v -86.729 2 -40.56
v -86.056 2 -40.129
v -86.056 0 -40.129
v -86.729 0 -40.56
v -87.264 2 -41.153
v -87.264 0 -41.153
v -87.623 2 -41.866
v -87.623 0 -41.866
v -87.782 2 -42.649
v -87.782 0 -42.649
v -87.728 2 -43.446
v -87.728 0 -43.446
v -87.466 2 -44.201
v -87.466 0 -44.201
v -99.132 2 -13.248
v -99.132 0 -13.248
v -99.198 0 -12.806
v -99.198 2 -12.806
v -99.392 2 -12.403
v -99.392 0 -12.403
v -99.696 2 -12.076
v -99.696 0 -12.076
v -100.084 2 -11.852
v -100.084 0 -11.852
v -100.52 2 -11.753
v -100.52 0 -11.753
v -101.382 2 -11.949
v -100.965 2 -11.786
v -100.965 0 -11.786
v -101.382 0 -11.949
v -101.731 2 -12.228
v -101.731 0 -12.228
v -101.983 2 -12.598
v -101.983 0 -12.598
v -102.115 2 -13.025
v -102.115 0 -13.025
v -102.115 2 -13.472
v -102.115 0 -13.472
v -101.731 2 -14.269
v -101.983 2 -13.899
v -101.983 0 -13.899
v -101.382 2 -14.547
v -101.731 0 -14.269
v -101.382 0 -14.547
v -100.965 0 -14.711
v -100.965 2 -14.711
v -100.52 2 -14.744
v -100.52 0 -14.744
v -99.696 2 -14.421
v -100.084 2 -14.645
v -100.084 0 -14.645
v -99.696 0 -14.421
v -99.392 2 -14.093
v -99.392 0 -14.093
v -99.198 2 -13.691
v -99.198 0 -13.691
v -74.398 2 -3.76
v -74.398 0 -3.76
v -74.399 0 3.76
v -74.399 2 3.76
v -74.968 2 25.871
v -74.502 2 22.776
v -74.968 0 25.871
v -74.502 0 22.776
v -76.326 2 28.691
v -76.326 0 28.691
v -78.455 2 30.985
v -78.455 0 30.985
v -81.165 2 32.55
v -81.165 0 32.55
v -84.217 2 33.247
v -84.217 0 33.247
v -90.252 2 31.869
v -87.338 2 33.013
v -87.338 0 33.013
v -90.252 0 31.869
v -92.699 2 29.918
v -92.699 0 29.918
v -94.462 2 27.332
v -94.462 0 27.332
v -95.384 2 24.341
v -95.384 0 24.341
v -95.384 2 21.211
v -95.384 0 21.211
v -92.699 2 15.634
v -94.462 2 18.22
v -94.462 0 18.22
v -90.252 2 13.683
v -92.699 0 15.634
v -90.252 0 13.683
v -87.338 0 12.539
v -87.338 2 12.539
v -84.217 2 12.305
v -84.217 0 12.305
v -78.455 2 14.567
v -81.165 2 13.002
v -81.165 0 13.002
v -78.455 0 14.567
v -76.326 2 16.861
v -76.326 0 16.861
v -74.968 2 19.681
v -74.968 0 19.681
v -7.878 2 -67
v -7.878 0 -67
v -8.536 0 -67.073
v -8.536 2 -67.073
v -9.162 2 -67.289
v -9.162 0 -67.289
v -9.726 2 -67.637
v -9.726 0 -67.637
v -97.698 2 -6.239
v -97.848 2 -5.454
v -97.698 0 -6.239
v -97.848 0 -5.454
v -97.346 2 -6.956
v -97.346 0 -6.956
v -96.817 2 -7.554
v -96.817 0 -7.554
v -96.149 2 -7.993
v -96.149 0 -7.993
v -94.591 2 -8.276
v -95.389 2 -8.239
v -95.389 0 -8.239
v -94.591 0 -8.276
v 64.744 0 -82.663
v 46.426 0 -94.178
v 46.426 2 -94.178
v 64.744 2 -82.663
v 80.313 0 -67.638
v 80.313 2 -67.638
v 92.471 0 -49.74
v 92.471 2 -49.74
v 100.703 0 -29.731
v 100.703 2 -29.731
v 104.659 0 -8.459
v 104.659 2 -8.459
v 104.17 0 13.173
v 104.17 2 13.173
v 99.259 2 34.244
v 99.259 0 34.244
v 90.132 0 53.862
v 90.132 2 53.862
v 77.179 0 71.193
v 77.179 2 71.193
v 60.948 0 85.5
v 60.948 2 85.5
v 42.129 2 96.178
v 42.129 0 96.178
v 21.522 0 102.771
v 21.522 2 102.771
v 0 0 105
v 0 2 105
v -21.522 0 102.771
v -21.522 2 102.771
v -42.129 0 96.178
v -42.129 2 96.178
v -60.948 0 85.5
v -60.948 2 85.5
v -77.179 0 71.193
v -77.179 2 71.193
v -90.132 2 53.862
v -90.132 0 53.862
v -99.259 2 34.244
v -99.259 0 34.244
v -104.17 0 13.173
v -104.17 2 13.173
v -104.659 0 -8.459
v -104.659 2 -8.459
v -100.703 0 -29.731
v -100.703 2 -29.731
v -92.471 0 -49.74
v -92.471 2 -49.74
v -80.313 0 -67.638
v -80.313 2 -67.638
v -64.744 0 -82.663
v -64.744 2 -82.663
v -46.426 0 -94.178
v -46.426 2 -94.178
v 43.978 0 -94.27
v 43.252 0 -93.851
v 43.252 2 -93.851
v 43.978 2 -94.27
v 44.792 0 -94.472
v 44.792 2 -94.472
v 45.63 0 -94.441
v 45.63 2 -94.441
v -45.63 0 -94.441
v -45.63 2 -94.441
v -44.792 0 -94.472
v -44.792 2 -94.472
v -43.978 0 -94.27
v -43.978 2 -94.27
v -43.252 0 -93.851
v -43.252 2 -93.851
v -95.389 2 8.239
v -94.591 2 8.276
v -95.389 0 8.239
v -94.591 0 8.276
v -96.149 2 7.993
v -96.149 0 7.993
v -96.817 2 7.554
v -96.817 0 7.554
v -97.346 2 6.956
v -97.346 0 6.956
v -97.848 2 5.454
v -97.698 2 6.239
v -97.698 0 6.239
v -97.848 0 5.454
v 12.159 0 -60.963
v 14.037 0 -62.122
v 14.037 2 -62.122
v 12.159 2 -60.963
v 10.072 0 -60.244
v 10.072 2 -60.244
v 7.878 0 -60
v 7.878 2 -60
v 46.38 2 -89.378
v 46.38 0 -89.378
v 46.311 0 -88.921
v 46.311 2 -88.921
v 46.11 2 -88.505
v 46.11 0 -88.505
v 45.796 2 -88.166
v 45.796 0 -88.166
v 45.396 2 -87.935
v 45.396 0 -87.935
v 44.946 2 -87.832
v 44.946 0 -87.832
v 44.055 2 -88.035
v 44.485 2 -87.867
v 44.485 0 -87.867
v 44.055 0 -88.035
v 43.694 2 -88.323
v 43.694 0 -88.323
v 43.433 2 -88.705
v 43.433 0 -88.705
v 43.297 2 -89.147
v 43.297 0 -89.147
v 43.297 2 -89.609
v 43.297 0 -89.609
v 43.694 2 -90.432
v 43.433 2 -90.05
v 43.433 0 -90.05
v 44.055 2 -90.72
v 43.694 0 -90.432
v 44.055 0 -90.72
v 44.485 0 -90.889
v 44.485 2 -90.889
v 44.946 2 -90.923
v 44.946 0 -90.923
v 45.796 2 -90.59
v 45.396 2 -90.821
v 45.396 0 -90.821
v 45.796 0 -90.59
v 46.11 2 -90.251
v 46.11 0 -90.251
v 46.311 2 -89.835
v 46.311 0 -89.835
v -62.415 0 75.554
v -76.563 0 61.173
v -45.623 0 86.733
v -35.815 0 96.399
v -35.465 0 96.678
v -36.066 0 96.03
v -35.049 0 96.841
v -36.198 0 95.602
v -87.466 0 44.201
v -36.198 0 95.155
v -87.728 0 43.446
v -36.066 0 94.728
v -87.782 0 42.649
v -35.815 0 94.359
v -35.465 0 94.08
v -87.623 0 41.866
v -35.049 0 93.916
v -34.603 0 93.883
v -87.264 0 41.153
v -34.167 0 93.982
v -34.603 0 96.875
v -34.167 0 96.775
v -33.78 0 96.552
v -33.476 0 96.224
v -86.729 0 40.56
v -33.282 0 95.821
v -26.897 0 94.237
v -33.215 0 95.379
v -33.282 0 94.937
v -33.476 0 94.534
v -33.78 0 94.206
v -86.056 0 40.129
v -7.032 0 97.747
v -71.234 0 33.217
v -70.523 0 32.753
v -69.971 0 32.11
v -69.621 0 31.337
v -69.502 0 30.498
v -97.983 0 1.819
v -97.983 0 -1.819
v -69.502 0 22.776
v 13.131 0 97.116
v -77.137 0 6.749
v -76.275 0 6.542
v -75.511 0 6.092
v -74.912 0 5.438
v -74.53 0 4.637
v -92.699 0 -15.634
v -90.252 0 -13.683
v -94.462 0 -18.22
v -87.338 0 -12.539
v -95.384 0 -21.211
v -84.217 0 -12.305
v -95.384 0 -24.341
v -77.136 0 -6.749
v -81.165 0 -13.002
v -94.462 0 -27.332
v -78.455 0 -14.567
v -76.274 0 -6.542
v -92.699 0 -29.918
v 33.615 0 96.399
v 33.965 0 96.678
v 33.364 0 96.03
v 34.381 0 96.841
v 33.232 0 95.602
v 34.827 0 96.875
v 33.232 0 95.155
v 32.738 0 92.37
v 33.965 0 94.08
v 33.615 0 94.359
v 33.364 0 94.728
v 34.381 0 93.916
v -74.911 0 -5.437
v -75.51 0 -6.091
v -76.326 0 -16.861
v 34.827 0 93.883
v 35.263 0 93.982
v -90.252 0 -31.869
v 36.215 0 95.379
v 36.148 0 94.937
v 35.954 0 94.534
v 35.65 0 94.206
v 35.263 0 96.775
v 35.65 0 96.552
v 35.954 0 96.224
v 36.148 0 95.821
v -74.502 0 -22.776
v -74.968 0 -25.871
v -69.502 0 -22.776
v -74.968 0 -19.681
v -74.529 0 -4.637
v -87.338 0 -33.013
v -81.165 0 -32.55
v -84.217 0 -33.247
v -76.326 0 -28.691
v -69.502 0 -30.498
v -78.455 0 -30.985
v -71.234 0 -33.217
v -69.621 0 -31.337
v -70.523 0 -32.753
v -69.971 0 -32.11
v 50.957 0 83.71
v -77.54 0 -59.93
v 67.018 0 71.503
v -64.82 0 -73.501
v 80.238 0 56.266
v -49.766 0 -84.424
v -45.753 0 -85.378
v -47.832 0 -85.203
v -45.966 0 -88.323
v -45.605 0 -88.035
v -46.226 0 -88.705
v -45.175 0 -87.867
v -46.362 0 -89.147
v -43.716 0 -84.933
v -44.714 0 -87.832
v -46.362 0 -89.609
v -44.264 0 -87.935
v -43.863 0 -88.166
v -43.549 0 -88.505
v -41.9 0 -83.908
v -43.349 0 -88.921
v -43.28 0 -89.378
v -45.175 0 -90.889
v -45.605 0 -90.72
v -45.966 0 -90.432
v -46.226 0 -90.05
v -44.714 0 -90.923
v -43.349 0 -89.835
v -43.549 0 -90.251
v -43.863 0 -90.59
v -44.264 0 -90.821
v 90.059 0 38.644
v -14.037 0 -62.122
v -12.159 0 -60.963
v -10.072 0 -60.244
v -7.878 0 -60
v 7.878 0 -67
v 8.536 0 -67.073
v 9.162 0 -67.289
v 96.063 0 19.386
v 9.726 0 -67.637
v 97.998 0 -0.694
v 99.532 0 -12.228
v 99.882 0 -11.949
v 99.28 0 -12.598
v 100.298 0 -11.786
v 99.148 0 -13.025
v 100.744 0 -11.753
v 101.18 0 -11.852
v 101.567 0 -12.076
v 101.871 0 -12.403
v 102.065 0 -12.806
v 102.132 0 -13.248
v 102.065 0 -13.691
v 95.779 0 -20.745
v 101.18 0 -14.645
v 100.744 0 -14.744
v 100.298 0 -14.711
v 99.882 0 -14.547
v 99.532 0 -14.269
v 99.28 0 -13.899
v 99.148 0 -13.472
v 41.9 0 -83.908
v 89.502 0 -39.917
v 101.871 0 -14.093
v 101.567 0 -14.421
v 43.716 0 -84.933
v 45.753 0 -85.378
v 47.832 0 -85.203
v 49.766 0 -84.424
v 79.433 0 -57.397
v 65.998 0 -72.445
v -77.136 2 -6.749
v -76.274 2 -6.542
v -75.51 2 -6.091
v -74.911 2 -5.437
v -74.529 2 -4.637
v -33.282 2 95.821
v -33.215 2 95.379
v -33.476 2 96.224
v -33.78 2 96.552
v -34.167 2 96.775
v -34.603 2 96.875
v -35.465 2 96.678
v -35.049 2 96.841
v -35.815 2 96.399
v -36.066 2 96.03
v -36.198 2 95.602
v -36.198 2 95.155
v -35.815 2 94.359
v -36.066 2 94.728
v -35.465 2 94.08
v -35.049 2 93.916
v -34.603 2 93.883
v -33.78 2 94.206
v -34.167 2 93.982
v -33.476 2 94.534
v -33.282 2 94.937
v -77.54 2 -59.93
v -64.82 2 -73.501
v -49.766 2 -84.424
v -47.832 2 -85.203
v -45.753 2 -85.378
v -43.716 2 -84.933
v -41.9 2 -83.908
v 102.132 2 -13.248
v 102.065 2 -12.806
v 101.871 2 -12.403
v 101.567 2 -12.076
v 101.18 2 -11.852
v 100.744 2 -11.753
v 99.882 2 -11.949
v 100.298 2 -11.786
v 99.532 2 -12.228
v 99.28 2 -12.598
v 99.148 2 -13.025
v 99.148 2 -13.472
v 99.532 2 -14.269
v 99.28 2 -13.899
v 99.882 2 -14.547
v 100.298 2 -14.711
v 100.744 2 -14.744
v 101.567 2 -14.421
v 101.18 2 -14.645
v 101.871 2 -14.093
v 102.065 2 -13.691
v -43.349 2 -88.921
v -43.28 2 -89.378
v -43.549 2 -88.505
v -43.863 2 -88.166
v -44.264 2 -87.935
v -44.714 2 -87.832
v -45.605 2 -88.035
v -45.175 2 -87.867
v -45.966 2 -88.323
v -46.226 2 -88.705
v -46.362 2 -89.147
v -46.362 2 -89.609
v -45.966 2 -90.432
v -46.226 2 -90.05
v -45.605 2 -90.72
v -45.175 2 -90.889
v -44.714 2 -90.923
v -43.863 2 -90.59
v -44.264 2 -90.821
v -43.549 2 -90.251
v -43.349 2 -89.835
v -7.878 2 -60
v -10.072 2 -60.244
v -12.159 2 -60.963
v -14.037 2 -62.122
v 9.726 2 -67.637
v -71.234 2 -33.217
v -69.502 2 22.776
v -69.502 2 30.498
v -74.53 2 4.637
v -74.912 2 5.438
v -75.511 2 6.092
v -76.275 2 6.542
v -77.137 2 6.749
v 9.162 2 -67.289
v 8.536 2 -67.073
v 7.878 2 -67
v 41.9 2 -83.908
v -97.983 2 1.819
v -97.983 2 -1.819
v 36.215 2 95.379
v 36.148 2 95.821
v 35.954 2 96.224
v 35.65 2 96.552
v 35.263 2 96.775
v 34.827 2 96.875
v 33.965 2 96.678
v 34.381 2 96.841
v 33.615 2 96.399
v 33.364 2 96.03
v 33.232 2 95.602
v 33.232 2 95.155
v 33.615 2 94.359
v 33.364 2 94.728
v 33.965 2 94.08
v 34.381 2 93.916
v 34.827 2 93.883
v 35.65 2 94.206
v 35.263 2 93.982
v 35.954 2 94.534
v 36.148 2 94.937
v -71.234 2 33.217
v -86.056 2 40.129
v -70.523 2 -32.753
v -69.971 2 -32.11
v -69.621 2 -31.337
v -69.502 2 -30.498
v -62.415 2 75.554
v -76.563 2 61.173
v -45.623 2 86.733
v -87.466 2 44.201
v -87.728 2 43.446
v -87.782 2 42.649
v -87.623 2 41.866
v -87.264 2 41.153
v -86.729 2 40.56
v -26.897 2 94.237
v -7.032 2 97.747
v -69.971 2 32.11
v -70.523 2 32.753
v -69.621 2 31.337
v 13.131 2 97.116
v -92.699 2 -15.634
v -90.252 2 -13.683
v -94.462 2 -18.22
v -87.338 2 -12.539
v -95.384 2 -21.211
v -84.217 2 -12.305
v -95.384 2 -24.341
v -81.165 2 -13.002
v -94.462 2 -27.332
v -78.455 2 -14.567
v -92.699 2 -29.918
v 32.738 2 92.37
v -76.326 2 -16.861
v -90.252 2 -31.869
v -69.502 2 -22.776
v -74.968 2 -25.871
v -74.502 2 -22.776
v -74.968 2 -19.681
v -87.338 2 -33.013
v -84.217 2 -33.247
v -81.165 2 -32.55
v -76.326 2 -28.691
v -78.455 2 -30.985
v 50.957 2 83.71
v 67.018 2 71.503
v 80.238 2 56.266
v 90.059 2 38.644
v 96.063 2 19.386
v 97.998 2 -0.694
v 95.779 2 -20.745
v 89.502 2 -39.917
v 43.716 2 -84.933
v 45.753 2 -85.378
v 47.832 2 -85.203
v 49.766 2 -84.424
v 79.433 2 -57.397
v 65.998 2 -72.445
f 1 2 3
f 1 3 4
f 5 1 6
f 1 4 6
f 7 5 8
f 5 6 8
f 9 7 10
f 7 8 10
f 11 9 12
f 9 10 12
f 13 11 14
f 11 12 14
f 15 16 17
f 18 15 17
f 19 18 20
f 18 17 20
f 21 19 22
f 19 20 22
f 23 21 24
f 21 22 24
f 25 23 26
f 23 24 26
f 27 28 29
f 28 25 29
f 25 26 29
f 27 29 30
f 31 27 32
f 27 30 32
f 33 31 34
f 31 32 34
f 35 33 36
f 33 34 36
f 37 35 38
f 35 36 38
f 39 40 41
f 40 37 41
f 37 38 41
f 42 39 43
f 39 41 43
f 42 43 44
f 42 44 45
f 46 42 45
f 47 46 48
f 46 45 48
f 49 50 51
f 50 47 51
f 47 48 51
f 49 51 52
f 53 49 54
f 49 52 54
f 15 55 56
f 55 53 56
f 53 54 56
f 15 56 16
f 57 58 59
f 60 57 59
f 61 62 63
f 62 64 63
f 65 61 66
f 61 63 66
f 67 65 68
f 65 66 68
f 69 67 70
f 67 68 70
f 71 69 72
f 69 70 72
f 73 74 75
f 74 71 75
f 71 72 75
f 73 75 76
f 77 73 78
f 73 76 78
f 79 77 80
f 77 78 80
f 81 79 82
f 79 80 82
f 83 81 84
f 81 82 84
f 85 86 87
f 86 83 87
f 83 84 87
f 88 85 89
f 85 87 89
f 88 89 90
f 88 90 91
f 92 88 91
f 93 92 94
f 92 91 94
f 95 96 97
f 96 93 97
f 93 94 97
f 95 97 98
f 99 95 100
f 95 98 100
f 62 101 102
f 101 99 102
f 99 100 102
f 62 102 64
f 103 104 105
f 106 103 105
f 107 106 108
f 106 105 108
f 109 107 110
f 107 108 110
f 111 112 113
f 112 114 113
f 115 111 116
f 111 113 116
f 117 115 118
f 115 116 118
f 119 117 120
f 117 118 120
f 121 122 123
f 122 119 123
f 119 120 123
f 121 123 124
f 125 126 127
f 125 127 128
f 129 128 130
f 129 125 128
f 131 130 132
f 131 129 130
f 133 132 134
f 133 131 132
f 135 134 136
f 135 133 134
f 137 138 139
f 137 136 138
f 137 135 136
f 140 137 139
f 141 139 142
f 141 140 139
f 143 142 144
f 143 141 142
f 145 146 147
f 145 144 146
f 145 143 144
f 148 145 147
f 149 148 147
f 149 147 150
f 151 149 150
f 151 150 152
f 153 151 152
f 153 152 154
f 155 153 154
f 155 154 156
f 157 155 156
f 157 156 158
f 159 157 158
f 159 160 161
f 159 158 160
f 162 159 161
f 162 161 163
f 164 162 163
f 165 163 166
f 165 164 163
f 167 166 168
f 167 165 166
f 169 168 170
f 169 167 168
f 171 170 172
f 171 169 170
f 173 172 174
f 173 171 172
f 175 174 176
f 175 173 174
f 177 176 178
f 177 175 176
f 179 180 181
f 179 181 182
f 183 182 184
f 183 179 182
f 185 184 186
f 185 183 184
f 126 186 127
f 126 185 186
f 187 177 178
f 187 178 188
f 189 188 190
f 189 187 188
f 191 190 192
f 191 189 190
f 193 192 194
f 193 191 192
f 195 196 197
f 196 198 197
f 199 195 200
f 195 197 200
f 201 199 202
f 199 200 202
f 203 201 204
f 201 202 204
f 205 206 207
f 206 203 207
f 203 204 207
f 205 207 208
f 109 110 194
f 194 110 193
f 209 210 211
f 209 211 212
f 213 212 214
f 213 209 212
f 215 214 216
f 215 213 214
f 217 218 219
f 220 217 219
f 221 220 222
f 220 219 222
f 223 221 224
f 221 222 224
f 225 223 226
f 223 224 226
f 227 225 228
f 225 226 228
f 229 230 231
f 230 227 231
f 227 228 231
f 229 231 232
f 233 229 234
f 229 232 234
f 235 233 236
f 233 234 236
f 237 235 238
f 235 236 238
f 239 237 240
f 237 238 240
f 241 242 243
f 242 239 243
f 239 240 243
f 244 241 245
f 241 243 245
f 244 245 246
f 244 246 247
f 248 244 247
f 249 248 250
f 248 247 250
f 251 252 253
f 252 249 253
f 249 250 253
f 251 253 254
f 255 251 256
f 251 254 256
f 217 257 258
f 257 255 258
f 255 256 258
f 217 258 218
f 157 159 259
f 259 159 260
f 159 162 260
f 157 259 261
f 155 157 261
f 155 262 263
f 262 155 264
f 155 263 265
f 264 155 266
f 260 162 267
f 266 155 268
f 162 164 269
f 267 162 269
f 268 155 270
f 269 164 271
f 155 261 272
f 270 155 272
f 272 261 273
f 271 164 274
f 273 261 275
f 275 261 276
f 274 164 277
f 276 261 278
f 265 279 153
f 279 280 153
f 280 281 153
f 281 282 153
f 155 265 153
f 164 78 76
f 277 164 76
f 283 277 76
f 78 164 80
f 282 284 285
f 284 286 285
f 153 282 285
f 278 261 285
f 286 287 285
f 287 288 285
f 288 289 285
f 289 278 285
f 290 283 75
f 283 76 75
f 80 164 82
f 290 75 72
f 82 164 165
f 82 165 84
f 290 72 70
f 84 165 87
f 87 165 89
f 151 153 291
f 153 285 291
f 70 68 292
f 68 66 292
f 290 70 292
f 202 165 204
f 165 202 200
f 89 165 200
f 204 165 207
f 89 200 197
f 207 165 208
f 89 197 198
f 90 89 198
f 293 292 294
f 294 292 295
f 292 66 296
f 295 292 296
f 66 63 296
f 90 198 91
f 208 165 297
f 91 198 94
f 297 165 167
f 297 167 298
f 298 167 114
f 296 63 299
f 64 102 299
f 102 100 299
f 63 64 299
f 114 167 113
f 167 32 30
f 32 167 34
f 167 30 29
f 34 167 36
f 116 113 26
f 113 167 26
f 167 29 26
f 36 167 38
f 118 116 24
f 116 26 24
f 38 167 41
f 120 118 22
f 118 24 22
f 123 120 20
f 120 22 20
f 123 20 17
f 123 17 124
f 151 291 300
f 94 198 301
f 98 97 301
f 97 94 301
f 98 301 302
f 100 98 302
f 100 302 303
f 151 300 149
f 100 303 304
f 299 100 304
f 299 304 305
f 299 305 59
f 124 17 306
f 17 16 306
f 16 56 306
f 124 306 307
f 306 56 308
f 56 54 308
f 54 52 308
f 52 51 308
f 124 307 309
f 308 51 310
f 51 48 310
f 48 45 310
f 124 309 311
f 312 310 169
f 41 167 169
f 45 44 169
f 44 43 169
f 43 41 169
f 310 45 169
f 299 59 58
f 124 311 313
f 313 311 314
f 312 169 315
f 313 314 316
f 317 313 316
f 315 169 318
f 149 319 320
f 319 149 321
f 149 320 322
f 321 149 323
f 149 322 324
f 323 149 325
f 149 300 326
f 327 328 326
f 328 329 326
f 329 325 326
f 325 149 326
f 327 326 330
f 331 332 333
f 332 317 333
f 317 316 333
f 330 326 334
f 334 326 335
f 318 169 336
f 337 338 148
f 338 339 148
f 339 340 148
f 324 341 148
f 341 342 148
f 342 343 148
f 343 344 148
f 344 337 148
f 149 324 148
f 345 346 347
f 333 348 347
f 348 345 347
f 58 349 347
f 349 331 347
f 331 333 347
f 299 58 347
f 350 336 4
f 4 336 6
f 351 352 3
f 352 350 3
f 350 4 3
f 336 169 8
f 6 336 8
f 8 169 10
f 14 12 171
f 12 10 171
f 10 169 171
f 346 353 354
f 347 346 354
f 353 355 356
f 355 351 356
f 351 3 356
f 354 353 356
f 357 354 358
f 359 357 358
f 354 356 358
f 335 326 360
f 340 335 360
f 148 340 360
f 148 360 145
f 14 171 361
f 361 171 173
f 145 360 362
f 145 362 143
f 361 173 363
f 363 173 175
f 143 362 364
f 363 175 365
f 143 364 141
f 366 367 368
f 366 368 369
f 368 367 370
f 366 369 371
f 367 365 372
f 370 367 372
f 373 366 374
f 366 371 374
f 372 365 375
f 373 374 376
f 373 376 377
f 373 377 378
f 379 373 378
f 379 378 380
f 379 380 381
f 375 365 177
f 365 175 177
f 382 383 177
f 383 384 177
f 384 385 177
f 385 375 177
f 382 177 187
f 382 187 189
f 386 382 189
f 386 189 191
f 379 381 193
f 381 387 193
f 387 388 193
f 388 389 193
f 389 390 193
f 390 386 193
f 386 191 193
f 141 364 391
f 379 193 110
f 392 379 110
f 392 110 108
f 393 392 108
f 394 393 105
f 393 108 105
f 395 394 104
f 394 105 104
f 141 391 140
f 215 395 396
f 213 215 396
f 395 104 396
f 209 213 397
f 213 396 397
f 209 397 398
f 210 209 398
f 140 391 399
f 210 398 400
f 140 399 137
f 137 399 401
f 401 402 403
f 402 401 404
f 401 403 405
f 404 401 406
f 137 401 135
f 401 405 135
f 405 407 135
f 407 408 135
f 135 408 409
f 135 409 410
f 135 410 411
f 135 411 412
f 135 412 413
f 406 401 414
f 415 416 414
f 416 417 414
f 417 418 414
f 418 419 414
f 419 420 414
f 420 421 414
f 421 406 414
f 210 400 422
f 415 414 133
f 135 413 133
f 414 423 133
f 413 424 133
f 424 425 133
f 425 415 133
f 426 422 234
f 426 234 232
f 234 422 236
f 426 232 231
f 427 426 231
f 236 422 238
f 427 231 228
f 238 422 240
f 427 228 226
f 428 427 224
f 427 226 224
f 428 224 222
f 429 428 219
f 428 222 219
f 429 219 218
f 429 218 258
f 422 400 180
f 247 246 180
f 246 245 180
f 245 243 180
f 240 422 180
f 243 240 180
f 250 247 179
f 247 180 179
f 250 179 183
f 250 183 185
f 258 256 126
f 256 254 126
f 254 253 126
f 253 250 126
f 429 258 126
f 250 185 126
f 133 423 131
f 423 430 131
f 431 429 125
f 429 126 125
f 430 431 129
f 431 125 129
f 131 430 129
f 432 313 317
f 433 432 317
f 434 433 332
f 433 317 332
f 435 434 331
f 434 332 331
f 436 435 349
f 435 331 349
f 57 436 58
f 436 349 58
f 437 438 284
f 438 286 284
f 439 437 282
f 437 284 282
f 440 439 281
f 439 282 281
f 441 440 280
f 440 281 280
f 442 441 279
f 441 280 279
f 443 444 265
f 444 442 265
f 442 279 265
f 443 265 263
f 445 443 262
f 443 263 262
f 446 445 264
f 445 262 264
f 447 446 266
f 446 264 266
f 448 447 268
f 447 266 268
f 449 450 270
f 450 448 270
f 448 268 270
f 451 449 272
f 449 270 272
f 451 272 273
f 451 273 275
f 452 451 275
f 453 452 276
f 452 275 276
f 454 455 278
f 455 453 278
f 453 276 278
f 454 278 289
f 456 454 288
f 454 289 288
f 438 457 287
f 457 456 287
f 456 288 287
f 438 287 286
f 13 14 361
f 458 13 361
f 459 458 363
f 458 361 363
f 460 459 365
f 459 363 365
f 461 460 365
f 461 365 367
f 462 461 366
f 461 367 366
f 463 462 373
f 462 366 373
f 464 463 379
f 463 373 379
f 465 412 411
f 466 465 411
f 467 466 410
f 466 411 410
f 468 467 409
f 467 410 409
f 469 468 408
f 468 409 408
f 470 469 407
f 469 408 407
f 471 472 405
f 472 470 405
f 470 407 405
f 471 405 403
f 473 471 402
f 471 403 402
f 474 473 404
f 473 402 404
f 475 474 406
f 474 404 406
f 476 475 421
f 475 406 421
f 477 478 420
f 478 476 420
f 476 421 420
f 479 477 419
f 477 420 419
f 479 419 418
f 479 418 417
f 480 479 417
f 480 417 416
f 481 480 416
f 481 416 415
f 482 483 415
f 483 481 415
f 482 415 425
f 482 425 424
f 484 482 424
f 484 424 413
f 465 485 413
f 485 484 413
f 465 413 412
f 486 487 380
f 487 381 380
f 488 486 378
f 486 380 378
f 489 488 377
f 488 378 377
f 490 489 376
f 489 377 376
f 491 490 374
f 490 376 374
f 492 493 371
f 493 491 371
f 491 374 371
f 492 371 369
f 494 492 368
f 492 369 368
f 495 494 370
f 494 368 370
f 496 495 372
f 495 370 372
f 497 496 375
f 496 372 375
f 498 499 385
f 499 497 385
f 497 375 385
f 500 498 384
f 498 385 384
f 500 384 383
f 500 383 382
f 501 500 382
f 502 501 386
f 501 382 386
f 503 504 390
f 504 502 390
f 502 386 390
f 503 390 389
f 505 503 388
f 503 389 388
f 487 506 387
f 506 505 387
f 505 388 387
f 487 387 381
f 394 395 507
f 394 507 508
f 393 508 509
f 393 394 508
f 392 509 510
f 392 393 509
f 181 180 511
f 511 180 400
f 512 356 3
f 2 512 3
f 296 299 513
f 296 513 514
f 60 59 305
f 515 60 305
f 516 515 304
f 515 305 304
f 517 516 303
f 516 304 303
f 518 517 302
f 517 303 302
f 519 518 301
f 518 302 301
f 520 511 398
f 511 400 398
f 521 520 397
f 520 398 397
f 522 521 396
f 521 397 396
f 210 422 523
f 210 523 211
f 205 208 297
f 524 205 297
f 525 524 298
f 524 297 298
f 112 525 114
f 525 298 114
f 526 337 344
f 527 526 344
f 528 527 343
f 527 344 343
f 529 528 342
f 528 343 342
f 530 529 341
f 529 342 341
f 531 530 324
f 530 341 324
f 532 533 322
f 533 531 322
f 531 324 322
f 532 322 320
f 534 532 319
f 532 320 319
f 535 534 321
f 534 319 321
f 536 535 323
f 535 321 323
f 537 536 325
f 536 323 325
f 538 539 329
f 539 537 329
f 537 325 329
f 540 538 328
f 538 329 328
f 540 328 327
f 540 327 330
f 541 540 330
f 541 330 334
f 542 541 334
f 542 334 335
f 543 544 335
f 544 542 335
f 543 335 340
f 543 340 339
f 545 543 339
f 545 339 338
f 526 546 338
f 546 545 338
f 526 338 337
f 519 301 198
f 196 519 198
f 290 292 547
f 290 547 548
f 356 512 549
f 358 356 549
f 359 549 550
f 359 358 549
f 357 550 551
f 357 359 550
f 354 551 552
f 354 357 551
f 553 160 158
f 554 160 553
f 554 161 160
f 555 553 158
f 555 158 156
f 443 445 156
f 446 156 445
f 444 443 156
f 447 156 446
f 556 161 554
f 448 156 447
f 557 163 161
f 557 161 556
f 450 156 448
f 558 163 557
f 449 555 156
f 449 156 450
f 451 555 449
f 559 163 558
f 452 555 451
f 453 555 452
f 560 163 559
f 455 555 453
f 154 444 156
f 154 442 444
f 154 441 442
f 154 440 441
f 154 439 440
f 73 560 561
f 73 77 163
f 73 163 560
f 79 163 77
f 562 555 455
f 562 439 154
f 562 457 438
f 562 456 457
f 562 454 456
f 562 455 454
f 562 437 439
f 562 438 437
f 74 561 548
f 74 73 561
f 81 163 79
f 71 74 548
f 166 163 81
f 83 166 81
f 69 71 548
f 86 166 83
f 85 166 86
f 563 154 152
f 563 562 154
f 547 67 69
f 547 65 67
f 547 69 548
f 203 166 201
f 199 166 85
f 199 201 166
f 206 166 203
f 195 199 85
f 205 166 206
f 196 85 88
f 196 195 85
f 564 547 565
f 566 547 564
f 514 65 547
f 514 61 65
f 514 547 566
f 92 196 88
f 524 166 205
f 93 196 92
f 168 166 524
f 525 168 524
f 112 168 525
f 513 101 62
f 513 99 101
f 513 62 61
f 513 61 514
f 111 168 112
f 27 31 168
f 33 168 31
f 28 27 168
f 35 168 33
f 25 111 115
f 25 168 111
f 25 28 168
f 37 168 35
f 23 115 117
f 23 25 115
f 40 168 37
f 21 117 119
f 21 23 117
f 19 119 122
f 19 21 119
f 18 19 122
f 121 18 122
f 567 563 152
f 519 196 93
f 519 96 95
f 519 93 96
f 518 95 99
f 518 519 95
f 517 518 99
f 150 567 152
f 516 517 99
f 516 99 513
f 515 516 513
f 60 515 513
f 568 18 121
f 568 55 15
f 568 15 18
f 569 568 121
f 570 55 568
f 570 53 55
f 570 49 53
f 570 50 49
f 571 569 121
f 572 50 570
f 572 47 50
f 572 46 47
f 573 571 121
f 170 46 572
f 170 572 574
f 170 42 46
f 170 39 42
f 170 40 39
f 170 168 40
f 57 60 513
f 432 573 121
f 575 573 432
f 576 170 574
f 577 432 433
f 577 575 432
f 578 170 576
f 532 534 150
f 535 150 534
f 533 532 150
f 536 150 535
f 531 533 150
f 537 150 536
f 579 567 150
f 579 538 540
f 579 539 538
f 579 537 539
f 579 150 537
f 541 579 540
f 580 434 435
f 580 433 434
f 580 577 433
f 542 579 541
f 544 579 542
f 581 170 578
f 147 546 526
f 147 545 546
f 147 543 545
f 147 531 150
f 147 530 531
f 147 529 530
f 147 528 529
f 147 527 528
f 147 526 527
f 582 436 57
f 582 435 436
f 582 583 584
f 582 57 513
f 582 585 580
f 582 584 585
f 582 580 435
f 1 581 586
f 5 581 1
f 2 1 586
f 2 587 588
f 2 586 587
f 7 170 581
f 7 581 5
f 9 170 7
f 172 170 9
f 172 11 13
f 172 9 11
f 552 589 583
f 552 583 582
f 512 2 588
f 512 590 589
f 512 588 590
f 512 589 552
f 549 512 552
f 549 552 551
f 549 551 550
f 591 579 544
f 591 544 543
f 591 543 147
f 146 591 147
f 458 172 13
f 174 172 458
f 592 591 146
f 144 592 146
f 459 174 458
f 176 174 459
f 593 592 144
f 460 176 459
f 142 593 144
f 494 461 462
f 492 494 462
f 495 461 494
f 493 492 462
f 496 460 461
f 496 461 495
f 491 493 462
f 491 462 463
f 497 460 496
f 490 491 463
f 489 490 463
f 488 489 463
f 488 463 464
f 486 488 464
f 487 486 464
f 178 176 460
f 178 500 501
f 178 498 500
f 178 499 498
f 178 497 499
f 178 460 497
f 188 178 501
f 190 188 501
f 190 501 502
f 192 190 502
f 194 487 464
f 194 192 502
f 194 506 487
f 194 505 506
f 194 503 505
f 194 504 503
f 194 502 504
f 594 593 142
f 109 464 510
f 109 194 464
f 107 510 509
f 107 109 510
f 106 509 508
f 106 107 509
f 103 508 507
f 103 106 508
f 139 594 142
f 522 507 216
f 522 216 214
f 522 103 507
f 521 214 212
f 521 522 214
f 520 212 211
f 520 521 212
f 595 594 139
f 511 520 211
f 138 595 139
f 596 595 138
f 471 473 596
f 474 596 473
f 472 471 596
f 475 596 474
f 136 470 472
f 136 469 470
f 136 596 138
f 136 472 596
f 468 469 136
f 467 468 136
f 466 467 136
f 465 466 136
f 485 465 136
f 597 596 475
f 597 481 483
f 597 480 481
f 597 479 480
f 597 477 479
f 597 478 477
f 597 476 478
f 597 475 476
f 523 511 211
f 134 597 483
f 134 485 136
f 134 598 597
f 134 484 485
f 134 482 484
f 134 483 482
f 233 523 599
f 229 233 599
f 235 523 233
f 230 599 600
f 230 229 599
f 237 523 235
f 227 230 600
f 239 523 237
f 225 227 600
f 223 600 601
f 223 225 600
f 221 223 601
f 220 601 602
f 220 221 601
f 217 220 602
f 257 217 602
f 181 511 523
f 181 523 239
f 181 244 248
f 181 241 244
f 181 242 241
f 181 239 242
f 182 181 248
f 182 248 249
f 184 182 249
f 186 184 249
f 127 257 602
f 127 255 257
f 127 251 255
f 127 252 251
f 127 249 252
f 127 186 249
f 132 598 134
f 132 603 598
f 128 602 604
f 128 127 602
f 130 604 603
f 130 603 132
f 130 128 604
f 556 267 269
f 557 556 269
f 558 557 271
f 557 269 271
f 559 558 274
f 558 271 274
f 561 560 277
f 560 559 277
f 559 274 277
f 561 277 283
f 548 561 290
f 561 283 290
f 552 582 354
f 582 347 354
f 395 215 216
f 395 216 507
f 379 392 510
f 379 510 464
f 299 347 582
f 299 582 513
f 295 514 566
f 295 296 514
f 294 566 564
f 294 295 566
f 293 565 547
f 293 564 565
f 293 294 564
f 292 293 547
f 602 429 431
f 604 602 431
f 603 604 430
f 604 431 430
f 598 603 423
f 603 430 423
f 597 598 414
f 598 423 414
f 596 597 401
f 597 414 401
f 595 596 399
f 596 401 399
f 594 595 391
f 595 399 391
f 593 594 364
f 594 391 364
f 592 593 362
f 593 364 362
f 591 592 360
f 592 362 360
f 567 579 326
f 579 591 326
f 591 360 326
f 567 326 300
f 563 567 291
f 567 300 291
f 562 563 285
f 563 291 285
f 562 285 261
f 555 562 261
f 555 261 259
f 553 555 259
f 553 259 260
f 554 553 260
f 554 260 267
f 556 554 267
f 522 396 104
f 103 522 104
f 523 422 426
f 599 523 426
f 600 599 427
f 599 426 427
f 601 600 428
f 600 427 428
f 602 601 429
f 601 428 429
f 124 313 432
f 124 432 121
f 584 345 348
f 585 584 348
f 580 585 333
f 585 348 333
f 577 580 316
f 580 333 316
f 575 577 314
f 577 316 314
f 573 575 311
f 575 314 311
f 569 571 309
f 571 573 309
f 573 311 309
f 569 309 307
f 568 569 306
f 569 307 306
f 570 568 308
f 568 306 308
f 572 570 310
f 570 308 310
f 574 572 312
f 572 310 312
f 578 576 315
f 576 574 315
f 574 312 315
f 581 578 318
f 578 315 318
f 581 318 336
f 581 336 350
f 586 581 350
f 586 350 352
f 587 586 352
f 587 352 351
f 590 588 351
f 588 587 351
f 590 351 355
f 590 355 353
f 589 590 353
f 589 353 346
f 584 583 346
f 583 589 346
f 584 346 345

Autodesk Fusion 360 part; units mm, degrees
sketch "Sketch1" plane through (0, 0, 0) normal (0, 1, 0) x (1, 0, 0)
  circle A0 centre (-85.0015, -22.7761) radius 10.5
  circle A1 centre (-85.0015, 22.7761) radius 10.5
  line L0 (-71.2336, 33.2168) -> (-86.0563, 40.1287)
  line L1 (-77.1365, 6.7486) -> (-94.5913, 8.2757)
  line L2 (-77.1374, -6.7486) -> (-94.5913, -8.2757)
  line L3 (-71.2336, -33.2168) -> (-86.0563, -40.1287)
  line L4 (-69.5015, 22.7761) -> (-69.5015, -22.7761)
  line L5 (-69.5015, 22.7761) -> (-69.5015, 30.4979)
  line L6 (-69.5015, -22.7761) -> (-69.5015, -30.4979)
  line L7 (-74.398, 3.7596) -> (-74.3988, -3.7604)
  arc A2 (-97.8481, 5.454) -> (-97.8481, -5.454) centre (0, 0) ccw
  arc A3 (-69.5015, 30.4979) -> (-71.2336, 33.2168) centre (-72.5015, 30.4979) ccw
  arc A4 (-87.466, 44.2007) -> (-86.0563, 40.1287) centre (-84.7884, 42.8476) ccw
  arc A5 (-94.5913, 8.2757) -> (-97.8481, 5.454) centre (-94.8528, 5.2871) ccw
  arc A6 (-97.8481, -5.454) -> (-94.5913, -8.2757) centre (-94.8528, -5.2871) ccw
  arc A7 (-77.1374, -6.7486) -> (-74.3988, -3.7604) centre (-77.3988, -3.7601) ccw
  arc A8 (-74.398, 3.7596) -> (-77.1365, 6.7486) centre (-77.398, 3.76) ccw
  arc A9 (-71.2336, -33.2168) -> (-69.5015, -30.4979) centre (-72.5015, -30.4979) ccw
  arc A10 (-86.0563, -40.1287) -> (-87.466, -44.2007) centre (-84.7884, -42.8476) ccw
  arc A11 (-46.4263, 94.1785) -> (46.4263, 94.1785) centre (0, 0) ccw
  arc A12 (-43.2519, 93.8511) -> (-46.4263, 94.1785) centre (-45.0998, 91.4877) ccw
  line L8 (-9.7255, 67.6367) -> (-43.2519, 93.8511)
  line L9 (7.8776, 67) -> (-7.8776, 67)
  line L10 (43.2519, 93.8511) -> (9.7255, 67.6367)
  arc A13 (46.4263, 94.1785) -> (43.2519, 93.8511) centre (45.0998, 91.4877) ccw
  arc A14 (-9.7255, 67.6367) -> (-7.8776, 67) centre (-7.8776, 70) ccw
  arc A15 (7.8776, 67) -> (9.7255, 67.6367) centre (7.8776, 70) ccw
  arc A16 (-46.4263, 94.1785) -> (46.4263, 94.1785) centre (0, 0) ccw
  arc A17 (-9.7255, 67.6367) -> (-7.8776, 67) centre (-7.8776, 70) ccw
  circle A18 centre (100.6317, 13.2484) radius 1.5
  circle A19 centre (-100.6317, 13.2484) radius 1.5
  circle A20 centre (-34.715, -95.3788) radius 1.5
  circle A21 centre (34.715, -95.3788) radius 1.5
  circle A22 centre (-44.8298, 89.3777) radius 1.55
  circle A23 centre (44.8298, 89.3777) radius 1.55
  line L11 (41.8995, 83.9078) -> (14.0372, 62.1222)
  arc A24 (7.8776, 60) -> (14.0372, 62.1222) centre (7.8776, 70) ccw
  line L12 (7.8776, 60) -> (-7.8776, 60)
  arc A25 (-14.0372, 62.1222) -> (-7.8776, 60) centre (-7.8776, 70) ccw
  line L13 (-14.0372, 62.1222) -> (-41.8995, 83.9078)
  arc A26 (-49.766, 84.4236) -> (-87.466, 44.2007) centre (0, 0) ccw
  arc A27 (-87.466, -44.2007) -> (49.766, 84.4236) centre (0, 0) ccw
  arc A28 (-41.8995, 83.9078) -> (-49.766, 84.4236) centre (-46.2112, 78.3934) ccw
  arc A29 (49.766, 84.4236) -> (41.8995, 83.9078) centre (46.2112, 78.3934) ccw
  dimension "d83" = 3
  dimension "d84" = 3
  dimension "d96" = 3
  dimension "d97" = 3
extrude "Extrude1" add sketch "Sketch1" along normal blind 2
